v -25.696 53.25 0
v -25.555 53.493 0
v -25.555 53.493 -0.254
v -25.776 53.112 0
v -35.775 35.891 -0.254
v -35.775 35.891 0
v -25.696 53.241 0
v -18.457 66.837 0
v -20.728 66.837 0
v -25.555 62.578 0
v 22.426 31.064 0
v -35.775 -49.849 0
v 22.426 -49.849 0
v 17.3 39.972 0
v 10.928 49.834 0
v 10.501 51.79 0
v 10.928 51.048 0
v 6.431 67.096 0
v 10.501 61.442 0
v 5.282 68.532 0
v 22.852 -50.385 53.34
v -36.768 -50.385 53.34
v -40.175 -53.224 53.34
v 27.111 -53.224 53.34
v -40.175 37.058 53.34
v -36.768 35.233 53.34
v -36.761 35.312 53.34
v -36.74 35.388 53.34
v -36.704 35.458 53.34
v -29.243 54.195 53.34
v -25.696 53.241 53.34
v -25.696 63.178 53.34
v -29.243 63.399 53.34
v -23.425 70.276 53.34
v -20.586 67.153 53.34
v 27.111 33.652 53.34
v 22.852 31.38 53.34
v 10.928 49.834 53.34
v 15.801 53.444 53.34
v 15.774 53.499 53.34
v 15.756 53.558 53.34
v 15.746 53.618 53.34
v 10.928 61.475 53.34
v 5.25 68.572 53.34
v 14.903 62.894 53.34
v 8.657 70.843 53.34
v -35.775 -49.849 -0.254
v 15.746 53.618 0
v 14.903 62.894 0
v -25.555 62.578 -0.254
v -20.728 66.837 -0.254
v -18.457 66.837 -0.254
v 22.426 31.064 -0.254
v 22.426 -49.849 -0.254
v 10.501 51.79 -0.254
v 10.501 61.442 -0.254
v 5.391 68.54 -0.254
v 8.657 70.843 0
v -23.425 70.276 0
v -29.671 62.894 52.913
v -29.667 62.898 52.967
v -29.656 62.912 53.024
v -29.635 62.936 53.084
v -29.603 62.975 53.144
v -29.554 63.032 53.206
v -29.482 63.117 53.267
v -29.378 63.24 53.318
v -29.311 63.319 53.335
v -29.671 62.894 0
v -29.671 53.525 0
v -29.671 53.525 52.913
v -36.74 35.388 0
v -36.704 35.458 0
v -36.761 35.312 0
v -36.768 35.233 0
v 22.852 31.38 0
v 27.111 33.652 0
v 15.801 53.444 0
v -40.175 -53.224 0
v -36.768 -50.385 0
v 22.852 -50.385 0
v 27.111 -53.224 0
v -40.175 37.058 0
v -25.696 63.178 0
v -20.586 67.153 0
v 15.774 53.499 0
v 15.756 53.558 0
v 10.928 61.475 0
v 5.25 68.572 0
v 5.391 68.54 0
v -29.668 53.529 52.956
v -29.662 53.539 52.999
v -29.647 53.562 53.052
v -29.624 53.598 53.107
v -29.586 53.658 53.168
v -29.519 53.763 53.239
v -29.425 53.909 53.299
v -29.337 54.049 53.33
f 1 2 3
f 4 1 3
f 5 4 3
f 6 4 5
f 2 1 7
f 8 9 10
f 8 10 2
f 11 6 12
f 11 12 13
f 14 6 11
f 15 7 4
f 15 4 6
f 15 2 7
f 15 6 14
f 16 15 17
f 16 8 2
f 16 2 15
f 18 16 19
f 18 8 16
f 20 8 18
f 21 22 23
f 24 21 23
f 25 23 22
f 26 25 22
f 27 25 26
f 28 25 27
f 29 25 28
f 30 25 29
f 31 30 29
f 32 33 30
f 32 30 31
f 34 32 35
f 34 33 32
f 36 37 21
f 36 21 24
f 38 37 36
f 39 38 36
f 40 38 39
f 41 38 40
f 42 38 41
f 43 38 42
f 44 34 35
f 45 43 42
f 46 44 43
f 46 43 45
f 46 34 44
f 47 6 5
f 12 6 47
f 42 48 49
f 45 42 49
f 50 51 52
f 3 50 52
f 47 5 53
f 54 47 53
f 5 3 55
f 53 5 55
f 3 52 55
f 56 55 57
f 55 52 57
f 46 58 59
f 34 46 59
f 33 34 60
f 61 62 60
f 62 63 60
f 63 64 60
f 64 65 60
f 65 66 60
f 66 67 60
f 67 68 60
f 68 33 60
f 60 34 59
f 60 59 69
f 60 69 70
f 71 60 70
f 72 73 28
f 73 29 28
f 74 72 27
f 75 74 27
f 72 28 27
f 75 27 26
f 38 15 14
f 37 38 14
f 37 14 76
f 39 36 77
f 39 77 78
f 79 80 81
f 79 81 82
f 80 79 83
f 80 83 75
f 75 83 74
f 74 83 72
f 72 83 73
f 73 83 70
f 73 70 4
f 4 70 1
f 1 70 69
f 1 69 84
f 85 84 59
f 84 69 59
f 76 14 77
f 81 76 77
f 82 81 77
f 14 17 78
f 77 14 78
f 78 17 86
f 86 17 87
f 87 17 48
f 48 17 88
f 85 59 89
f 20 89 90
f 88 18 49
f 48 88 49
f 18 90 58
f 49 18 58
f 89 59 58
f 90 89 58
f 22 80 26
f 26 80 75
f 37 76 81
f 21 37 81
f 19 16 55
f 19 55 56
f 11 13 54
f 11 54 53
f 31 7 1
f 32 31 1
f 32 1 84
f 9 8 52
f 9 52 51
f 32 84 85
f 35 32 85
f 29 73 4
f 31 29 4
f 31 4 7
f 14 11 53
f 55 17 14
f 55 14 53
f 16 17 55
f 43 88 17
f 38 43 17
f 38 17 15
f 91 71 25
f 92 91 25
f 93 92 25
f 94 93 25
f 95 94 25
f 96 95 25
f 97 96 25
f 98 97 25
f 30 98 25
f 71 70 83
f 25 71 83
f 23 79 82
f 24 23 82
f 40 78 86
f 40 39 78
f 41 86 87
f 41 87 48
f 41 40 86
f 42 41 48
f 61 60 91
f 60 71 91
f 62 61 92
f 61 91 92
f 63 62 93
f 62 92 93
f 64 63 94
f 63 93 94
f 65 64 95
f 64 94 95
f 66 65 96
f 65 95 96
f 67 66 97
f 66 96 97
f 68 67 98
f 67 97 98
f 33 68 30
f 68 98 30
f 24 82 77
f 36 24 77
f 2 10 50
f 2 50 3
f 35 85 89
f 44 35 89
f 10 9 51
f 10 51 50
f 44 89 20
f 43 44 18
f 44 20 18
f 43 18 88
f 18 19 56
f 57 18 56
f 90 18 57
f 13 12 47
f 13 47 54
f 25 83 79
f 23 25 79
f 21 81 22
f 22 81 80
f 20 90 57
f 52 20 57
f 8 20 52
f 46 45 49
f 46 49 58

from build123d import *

# Parameters (mm, degrees)
F1_DEPTH = 53.34
F3_DEPTH = 0.254
F4_R     = 0.427399


with BuildPart() as f1:
    # F0 (on Top) → F1 (new body)
    with BuildSketch(Plane.XY):
        Polygon((-29.670693, 53.525094), (-40.17527, 37.058461), (-40.17527, -53.224109), (27.1108, -53.224109), (27.1108, 33.651568), (15.754499, 53.525094), (14.902776, 62.894039), (8.656814, 70.843451), (-23.42473, 70.275635), (-29.670693, 62.894039), align=None)
        Polygon((-25.695989, 63.177943), (-20.585654, 67.152657), (5.249925, 68.572186), (10.928073, 61.474502), (10.928073, 49.834296), (22.85219, 31.380311), (22.85219, -50.385039), (-36.768381, -50.385039), (-36.768381, 35.355017), (-25.695989, 53.241186), align=None, mode=Mode.SUBTRACT)
    extrude(amount=F1_DEPTH)

    # F2 (on Top) → F3 (join)
    with BuildSketch(Plane.XY):
        Polygon((-18.457072, 66.836618), (-20.728331, 66.836618), (-25.554758, 62.578008), (-25.554758, 53.492971), (-35.775427, 35.890706), (-35.775427, -49.84935), (22.425605, -49.84935), (22.425605, 31.064278), (10.501488, 51.789522), (10.501488, 61.442375), (5.391155, 68.540059), align=None)
    extrude(amount=-F3_DEPTH)

    # F4
    f4_edges = [f1.edges().sort_by_distance(p)[0] for p in [
        (-36.768381, 35.355017, 26.67),
        (-29.670693, 58.209566, 53.34),
        (15.754499, 53.525094, 26.67),
    ]]
    fillet(f4_edges, radius=F4_R)


solid = f1.part
